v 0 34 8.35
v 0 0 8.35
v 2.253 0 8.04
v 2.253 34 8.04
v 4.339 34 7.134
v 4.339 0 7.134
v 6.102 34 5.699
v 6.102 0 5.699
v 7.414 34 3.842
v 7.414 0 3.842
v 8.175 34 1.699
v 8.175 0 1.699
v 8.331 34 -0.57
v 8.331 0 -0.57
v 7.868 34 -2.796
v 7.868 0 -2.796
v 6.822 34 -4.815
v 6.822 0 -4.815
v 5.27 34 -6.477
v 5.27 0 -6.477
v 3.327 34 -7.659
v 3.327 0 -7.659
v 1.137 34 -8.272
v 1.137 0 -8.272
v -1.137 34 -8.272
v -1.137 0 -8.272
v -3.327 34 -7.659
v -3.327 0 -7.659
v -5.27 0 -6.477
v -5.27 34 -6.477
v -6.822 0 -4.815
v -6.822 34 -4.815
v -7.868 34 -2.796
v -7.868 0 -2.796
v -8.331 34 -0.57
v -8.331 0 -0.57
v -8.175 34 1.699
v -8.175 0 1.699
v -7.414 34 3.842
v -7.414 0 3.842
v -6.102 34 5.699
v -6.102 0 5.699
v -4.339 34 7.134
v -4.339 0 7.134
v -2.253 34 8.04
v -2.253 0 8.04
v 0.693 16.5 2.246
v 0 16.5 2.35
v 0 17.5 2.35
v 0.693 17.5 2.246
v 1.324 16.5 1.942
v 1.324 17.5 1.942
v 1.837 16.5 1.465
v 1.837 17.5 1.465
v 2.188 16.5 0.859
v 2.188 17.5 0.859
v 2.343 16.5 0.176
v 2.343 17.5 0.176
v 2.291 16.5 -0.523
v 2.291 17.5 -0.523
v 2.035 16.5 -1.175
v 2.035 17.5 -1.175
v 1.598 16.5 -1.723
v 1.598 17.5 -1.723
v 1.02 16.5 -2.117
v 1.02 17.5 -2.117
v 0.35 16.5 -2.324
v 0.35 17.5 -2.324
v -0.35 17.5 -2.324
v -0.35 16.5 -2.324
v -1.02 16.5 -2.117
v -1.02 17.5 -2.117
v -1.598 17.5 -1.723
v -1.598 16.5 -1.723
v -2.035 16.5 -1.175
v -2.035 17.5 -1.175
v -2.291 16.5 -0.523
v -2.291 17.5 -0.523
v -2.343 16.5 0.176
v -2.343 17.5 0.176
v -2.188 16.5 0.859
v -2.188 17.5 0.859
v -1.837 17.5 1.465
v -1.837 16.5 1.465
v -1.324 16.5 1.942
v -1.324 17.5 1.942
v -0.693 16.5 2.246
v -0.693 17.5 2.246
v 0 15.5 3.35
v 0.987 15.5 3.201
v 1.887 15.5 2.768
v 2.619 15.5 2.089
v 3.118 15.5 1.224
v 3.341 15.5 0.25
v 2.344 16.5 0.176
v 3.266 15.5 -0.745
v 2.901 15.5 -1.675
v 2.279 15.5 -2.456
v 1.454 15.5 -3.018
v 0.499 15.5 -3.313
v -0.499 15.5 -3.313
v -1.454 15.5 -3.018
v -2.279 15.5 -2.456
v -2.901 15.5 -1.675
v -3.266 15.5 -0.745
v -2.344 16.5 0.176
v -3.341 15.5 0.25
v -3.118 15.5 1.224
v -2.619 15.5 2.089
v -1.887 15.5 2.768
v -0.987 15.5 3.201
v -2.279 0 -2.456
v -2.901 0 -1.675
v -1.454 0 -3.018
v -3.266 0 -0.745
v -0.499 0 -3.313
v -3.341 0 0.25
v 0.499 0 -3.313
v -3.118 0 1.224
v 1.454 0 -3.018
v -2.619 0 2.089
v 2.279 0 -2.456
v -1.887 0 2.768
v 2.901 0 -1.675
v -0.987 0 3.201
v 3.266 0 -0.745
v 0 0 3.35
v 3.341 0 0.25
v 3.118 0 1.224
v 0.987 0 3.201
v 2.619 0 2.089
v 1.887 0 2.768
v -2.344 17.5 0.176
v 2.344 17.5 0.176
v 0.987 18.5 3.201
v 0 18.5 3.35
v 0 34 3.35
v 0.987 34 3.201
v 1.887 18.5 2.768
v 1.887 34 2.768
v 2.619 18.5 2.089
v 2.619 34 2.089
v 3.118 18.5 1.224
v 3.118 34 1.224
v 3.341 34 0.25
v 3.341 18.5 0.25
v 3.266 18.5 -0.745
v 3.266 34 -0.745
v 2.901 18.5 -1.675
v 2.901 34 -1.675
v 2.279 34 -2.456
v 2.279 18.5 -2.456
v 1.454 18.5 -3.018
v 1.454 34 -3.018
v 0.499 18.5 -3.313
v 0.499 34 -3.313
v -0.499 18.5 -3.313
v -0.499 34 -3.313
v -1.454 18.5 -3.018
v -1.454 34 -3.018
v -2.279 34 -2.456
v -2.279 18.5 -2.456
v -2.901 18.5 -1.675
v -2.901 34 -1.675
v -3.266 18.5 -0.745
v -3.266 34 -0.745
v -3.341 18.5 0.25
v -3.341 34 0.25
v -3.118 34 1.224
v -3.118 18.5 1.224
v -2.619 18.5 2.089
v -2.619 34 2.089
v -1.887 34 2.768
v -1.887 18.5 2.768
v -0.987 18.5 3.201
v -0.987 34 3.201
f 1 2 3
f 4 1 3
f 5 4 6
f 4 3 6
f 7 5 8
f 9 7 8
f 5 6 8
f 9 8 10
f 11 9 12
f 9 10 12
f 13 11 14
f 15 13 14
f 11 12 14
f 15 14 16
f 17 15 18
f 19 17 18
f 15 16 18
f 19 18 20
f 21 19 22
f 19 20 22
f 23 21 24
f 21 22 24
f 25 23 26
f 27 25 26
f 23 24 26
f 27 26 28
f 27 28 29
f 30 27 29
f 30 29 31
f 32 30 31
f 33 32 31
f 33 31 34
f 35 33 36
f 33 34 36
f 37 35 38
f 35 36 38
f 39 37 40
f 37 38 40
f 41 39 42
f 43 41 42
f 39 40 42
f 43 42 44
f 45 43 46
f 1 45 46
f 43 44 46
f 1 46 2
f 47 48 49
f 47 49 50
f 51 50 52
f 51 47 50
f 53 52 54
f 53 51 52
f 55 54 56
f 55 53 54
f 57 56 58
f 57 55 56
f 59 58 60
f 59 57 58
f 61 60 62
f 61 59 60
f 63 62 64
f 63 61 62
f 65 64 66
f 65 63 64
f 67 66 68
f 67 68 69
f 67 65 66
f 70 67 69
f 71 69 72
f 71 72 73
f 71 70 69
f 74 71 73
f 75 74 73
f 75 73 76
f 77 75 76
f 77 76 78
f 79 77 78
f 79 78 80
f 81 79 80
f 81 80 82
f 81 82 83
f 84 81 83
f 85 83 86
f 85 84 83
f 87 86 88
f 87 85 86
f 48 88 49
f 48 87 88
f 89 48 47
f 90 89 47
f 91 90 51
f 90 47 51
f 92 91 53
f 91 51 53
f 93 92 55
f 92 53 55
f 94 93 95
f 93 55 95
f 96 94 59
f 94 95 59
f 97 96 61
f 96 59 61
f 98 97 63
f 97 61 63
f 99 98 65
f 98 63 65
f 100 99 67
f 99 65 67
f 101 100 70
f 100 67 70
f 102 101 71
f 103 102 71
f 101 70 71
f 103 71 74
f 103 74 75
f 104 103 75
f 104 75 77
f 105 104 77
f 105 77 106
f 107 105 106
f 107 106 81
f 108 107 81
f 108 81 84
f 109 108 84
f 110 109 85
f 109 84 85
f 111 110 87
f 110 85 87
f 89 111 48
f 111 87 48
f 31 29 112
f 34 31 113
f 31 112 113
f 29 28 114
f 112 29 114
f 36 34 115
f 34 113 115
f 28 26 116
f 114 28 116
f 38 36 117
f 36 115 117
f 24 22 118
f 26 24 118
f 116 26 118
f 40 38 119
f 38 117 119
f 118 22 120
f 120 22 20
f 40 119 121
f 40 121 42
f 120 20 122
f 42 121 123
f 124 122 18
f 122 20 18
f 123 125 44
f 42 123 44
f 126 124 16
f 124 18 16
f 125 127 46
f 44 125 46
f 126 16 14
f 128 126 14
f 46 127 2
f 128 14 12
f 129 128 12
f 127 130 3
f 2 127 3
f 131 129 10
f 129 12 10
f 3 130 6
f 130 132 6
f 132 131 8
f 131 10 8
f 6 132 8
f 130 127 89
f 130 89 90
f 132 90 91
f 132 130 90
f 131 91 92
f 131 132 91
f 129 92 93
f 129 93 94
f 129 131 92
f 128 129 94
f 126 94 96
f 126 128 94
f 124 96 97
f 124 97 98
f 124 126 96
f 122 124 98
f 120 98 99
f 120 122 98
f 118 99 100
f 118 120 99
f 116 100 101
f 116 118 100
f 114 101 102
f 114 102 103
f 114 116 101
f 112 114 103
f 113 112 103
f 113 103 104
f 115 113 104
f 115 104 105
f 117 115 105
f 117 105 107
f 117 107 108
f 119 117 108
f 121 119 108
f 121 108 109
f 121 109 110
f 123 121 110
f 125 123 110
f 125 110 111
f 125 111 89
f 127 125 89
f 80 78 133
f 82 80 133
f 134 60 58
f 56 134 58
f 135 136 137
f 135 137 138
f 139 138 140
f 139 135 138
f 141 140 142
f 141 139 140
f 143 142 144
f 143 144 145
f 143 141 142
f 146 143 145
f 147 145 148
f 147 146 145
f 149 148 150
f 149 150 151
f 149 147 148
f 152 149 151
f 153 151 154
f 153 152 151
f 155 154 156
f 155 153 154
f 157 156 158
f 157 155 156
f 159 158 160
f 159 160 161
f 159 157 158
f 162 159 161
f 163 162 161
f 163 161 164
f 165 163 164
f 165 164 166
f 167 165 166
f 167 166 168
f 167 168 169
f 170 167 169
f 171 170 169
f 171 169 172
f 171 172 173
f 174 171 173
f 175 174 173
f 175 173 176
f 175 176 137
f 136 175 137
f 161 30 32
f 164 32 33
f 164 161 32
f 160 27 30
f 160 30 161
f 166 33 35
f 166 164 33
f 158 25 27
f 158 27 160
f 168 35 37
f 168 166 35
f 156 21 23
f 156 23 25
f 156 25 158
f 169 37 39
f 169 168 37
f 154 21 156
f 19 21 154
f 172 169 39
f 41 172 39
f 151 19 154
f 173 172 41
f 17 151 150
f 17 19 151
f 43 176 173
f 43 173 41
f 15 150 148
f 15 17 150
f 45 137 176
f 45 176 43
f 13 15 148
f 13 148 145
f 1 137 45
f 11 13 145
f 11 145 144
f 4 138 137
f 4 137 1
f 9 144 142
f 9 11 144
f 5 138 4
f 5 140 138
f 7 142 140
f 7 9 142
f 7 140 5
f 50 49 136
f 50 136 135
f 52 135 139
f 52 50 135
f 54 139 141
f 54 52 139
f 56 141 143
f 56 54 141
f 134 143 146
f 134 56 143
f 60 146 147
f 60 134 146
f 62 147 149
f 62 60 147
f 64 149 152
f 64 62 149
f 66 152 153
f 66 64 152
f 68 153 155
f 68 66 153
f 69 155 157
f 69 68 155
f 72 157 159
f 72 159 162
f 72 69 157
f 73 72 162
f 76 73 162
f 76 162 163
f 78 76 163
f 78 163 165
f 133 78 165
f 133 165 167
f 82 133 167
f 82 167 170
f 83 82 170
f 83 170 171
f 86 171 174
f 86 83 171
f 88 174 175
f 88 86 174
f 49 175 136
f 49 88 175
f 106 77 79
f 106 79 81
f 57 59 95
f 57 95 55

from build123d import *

# Parameters (mm, degrees)
SKETCH1_R                = 8.35
SKETCH1_R_2              = 3.35
BOSS_EXTRUDE1_DEPTH      = 34
BOSS_EXTRUDE2_DEPTH      = 0.5
BOSS_EXTRUDE2_DEPTH_BACK = 0.5
SKETCH2_R                = 3.35
SKETCH2_R_2              = 2.35
CHAMFER1_SIZE            = 1


with BuildPart() as part:
    # Sketch1 → Boss-Extrude1 (new body)
    with BuildSketch(Plane(origin=(0, 0, 0), x_dir=(1, 0, 0), z_dir=(0, 1, 0))):
        with Locations(Location((0, 0, 0), (0, 0, 270))):
            Circle(SKETCH1_R)
        with Locations(Location((0, 0, 0), (0, 0, 270))):
            Circle(SKETCH1_R_2, mode=Mode.SUBTRACT)
    extrude(amount=BOSS_EXTRUDE1_DEPTH)

    # Sketch2 → Boss-Extrude2 (add, two sides: drawn at the far end of the back side and taken through both)
    with BuildSketch(Plane(origin=(0, 17, 0), x_dir=(1, 0, 0), z_dir=(0, 1, 0)).offset(-BOSS_EXTRUDE2_DEPTH_BACK)):
        with Locations(Location((0, 0, 0), (0, 0, 270))):
            Circle(SKETCH2_R)
        with Locations(Location((0, 0, 0), (0, 0, 270))):
            Circle(SKETCH2_R_2, mode=Mode.SUBTRACT)
    extrude(amount=BOSS_EXTRUDE2_DEPTH + BOSS_EXTRUDE2_DEPTH_BACK)

    # Chamfer1
    chamfer1_edges = [part.edges().sort_by_distance(p)[0] for p in [
        (0, 17.5, -3.35),
        (0, 16.5, -3.35),
    ]]
    chamfer(chamfer1_edges, length=CHAMFER1_SIZE - 0.0001)  # a hair under: the kernel refuses the full size


solid = part.part
